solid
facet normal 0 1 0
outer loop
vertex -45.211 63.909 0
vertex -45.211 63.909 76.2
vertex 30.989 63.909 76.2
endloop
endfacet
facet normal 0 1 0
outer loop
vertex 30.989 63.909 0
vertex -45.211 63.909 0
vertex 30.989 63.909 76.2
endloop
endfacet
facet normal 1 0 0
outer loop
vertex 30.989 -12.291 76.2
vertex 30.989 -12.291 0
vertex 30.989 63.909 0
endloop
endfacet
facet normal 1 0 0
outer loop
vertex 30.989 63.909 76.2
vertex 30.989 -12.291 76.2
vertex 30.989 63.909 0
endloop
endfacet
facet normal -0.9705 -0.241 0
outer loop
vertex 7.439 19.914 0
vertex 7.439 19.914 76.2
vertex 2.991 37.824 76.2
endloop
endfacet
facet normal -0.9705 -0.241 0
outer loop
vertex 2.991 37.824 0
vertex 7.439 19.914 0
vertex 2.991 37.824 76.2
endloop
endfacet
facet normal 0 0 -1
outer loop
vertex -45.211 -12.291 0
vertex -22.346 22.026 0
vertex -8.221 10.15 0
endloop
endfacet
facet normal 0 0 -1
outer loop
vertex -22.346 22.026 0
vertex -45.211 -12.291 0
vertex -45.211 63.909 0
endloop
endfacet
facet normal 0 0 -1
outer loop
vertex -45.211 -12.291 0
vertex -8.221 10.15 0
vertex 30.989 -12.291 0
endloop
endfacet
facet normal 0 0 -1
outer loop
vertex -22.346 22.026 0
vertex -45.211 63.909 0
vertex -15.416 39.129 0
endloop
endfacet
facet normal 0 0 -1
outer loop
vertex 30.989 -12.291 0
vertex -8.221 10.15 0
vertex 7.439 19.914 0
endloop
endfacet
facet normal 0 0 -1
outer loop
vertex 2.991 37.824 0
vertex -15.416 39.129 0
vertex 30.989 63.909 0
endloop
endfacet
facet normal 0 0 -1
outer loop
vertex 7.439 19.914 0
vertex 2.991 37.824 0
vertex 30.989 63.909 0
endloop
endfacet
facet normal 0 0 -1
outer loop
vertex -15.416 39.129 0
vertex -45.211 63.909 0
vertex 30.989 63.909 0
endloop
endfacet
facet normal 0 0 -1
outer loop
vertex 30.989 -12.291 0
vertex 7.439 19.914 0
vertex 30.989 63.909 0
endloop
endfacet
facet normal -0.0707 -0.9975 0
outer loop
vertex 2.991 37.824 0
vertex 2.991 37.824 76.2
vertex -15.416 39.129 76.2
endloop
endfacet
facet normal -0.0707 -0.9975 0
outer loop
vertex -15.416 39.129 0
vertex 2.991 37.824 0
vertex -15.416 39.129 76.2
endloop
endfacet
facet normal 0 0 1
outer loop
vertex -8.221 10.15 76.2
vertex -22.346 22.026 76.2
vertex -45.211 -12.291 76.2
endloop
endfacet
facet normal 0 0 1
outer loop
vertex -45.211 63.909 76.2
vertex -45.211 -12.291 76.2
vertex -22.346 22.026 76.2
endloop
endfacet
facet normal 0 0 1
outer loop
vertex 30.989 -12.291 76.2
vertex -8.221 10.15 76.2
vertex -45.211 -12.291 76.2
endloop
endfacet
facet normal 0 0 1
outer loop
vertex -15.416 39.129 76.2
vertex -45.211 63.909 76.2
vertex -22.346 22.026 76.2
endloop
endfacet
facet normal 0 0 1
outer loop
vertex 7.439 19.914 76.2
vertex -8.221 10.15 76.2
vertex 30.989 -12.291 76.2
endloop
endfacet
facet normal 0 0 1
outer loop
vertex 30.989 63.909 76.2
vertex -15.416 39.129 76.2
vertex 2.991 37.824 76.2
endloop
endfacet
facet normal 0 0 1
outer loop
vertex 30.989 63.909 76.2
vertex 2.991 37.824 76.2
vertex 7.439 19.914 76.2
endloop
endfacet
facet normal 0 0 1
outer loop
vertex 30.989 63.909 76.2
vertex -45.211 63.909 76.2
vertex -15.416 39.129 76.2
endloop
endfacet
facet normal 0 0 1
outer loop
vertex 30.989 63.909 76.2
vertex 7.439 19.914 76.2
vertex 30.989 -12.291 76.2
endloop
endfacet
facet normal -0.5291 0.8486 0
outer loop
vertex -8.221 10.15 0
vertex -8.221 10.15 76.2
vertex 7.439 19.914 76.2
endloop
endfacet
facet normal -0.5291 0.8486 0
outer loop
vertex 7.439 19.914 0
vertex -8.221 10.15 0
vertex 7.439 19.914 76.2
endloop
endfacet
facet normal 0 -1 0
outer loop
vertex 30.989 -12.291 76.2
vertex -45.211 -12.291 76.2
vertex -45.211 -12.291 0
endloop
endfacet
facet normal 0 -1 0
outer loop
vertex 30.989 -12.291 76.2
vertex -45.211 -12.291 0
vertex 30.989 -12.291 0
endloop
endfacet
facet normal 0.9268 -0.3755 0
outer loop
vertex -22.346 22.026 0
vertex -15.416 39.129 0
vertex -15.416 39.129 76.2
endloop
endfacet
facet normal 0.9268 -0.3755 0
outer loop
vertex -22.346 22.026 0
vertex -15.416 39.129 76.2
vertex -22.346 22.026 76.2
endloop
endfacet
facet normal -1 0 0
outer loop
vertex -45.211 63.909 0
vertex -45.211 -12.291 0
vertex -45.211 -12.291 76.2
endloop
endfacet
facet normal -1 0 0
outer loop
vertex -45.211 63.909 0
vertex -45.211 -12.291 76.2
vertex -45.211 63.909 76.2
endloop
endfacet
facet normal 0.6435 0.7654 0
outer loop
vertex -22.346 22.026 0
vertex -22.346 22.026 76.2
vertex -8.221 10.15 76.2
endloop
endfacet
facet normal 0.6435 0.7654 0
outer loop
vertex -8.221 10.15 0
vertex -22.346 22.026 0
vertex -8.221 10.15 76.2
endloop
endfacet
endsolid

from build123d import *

# Parameters (mm, degrees)
F0_W     = 76.2
F0_H     = 76.2
F1_DEPTH = 76.2
F3_DEPTH = 76.2


with BuildPart() as f1:
    # F0 (on Top) → F1 (new body)
    with BuildSketch(Plane.XY):
        with Locations((-7.110626, 25.808547)):
            Rectangle(F0_W, F0_H)
    extrude(amount=F1_DEPTH)

    # F2 (on face) → F3 (cut)
    with BuildSketch(Plane.XY.offset(76.2)):
        Polygon((-8.220765, 10.149787), (7.438689, 19.913918), (2.991485, 37.824227), (-15.416492, 39.129274), (-22.346044, 22.02553), align=None)
    extrude(amount=-F3_DEPTH, mode=Mode.SUBTRACT)


solid = f1.part
